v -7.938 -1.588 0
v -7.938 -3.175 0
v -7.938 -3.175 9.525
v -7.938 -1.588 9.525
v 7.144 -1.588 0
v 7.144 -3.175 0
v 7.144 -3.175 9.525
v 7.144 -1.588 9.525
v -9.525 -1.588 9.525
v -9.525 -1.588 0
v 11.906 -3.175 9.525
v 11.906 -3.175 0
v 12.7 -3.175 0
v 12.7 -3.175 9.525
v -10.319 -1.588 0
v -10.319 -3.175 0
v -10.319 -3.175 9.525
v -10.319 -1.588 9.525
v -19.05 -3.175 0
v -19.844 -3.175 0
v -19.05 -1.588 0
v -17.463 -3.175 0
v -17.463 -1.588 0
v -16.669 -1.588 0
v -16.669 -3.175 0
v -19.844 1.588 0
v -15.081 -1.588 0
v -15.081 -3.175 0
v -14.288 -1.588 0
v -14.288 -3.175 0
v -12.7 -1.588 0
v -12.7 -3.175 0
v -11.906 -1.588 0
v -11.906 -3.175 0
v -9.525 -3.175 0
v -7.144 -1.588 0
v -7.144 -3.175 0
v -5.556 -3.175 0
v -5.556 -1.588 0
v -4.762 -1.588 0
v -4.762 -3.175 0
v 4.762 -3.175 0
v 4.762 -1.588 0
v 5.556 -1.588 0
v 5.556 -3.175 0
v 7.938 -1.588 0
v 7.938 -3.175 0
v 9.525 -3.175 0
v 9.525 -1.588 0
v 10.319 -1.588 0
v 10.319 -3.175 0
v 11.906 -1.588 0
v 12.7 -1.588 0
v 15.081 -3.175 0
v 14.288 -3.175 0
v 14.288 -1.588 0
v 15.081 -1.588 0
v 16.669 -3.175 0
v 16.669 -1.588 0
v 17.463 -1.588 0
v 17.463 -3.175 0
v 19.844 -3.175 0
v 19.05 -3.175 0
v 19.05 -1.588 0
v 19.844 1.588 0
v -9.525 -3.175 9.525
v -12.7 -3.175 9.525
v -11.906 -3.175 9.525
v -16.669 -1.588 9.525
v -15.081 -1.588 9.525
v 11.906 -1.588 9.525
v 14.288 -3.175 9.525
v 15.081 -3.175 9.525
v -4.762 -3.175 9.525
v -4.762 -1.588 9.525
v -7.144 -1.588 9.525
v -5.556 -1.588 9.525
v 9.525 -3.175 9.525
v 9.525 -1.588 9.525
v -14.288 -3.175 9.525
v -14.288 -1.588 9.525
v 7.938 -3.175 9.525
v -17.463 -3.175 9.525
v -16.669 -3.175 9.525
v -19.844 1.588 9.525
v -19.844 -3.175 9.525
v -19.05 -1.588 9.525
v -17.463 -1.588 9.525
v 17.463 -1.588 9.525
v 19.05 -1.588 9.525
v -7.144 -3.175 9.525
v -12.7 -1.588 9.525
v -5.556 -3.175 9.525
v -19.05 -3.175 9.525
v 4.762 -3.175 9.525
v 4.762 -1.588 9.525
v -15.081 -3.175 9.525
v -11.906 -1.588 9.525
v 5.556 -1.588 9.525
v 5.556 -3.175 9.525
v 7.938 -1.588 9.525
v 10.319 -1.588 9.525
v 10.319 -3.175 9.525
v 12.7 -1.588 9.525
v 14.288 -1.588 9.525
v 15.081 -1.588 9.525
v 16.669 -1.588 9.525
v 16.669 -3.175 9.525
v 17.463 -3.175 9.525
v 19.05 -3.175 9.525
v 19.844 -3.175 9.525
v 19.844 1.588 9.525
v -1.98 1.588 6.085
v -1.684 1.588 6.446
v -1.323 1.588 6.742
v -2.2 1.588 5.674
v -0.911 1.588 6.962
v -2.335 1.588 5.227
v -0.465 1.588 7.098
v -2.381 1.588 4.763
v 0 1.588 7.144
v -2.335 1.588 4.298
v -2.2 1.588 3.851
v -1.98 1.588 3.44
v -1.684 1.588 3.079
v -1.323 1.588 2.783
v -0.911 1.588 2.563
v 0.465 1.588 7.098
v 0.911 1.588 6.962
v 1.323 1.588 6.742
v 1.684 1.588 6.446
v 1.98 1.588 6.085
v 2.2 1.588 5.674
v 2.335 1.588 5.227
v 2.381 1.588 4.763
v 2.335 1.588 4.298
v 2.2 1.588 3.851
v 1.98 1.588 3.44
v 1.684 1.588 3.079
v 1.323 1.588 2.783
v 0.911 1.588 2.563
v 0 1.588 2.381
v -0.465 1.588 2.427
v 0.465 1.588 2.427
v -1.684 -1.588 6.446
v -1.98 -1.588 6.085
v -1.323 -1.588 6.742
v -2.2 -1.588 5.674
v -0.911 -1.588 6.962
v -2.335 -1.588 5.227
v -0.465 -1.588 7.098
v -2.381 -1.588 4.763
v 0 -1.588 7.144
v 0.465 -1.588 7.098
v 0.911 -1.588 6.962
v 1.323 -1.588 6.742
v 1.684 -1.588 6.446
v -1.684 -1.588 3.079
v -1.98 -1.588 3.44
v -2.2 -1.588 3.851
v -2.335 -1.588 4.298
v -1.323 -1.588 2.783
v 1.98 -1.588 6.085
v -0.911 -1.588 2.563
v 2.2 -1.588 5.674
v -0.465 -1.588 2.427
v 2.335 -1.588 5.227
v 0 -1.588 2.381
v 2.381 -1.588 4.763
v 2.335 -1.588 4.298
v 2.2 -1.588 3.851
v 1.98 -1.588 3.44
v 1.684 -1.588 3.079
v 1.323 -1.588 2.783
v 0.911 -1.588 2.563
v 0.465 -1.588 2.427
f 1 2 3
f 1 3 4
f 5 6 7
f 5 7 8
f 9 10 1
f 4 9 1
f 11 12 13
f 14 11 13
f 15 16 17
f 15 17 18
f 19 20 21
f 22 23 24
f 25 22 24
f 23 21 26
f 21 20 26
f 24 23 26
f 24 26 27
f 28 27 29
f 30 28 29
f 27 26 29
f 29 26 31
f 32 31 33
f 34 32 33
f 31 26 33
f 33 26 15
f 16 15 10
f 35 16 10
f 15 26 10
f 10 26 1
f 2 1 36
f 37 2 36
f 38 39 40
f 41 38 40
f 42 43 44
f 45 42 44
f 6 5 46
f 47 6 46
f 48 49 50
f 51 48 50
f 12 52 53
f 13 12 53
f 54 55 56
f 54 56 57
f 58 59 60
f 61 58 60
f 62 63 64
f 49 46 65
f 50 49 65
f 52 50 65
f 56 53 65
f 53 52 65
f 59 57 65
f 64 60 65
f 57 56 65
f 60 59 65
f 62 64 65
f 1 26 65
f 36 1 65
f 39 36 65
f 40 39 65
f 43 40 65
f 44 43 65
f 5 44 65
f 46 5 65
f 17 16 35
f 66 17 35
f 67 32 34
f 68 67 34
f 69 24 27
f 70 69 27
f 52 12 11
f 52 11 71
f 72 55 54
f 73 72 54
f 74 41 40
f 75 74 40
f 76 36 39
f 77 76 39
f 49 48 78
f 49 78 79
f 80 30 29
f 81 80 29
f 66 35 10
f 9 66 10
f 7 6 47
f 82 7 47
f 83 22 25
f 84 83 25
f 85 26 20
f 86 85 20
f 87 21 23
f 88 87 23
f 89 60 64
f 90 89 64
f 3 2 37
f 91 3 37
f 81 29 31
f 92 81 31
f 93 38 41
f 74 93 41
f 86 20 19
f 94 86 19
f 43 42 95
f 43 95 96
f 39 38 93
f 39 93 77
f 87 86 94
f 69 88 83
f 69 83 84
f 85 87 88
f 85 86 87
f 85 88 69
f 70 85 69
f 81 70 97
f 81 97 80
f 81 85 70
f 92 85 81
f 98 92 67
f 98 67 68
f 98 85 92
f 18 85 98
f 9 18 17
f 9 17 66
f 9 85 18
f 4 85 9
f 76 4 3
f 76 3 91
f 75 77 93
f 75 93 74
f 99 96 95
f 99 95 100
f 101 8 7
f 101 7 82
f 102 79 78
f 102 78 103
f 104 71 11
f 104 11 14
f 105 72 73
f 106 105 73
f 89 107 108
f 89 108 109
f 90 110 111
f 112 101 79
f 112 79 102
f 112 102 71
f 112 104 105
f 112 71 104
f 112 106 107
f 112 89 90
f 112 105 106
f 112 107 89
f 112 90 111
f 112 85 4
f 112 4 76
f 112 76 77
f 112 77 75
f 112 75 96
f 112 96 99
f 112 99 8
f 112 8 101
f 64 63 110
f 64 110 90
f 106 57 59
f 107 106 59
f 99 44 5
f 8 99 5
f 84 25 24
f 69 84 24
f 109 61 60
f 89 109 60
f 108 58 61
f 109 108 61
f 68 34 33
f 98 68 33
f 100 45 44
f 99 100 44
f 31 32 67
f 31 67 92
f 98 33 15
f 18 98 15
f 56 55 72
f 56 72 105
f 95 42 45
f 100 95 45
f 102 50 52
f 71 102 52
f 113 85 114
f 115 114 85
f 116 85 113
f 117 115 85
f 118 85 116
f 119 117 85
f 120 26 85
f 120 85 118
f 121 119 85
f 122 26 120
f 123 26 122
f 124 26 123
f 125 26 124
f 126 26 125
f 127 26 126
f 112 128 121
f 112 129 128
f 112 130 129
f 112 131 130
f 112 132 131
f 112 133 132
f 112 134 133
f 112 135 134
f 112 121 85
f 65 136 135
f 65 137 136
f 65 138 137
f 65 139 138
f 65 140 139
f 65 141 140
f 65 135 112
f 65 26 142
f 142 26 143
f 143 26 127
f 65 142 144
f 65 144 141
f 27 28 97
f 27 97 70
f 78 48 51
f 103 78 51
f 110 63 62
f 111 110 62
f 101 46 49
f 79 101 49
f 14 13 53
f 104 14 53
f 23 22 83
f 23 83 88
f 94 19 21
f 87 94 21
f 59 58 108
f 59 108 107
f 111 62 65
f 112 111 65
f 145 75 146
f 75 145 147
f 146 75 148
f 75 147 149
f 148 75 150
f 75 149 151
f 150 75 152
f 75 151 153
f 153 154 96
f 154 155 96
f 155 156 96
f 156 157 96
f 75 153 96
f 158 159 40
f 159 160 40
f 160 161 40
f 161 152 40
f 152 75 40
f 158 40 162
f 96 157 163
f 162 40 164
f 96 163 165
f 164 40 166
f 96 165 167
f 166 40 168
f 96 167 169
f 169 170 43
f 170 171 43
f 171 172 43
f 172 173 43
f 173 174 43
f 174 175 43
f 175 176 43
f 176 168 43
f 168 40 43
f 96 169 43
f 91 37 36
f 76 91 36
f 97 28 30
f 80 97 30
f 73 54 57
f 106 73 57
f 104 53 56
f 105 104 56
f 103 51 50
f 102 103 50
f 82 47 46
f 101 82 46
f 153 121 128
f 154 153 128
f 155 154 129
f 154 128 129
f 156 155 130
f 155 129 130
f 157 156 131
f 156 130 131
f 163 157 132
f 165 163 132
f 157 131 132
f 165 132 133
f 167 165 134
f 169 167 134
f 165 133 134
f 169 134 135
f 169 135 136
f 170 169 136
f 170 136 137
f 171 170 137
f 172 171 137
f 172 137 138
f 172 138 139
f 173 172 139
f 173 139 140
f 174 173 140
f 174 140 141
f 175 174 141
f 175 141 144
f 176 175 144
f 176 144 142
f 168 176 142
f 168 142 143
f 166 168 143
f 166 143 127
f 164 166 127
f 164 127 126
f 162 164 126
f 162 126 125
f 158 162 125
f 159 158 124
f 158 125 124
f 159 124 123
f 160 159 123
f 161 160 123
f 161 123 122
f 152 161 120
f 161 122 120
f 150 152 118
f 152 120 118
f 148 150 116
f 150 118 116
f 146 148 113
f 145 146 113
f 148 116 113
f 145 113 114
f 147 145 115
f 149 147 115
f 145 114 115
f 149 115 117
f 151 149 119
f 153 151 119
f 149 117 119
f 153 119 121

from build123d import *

# Parameters (mm, degrees)
SKETCH1_W           = 0.79375
SKETCH1_H           = 1.5875
SKETCH1_W_2         = 39.6875
SKETCH1_H_2         = 3.175
BOSS_EXTRUDE1_DEPTH = 9.525
SKETCH2_R           = 2.38125
CUT_EXTRUDE1_DEPTH  = 9.525


with BuildPart() as part:
    # Sketch1 → Boss-Extrude1 (new body)
    with BuildSketch(Plane.XY):
        with Locations((-19.446875, -2.38125)):
            Rectangle(SKETCH1_W, SKETCH1_H)
        with Locations((-17.065625, -2.38125)):
            Rectangle(SKETCH1_W, SKETCH1_H)
        with Locations((-14.684375, -2.38125)):
            Rectangle(SKETCH1_W, SKETCH1_H)
        with Locations((-12.303125, -2.38125)):
            Rectangle(SKETCH1_W, SKETCH1_H)
        with Locations((-9.921875, -2.38125)):
            Rectangle(SKETCH1_W, SKETCH1_H)
        with Locations((-7.540625, -2.38125)):
            Rectangle(SKETCH1_W, SKETCH1_H)
        with Locations((-5.159375, -2.38125)):
            Rectangle(SKETCH1_W, SKETCH1_H)
        with Locations((5.159375, -2.38125)):
            Rectangle(SKETCH1_W, SKETCH1_H)
        with Locations((7.540625, -2.38125)):
            Rectangle(SKETCH1_W, SKETCH1_H)
        with Locations((9.921875, -2.38125)):
            Rectangle(SKETCH1_W, SKETCH1_H)
        with Locations((12.303125, -2.38125)):
            Rectangle(SKETCH1_W, SKETCH1_H)
        with Locations((14.684375, -2.38125)):
            Rectangle(SKETCH1_W, SKETCH1_H)
        with Locations((17.065625, -2.38125)):
            Rectangle(SKETCH1_W, SKETCH1_H)
        with Locations((19.446875, -2.38125)):
            Rectangle(SKETCH1_W, SKETCH1_H)
        Rectangle(SKETCH1_W_2, SKETCH1_H_2)
    extrude(amount=BOSS_EXTRUDE1_DEPTH)

    # Sketch2 → Cut-Extrude1 (cut)
    with BuildSketch(Plane(origin=(0, 1.5875, 0), x_dir=(1, 0, 0), z_dir=(0, 1, 0))):
        with Locations(Location((0, -4.7625, 0), (0, 0, 270))):
            Circle(SKETCH2_R)
    extrude(amount=-CUT_EXTRUDE1_DEPTH, mode=Mode.SUBTRACT)


solid = part.part
